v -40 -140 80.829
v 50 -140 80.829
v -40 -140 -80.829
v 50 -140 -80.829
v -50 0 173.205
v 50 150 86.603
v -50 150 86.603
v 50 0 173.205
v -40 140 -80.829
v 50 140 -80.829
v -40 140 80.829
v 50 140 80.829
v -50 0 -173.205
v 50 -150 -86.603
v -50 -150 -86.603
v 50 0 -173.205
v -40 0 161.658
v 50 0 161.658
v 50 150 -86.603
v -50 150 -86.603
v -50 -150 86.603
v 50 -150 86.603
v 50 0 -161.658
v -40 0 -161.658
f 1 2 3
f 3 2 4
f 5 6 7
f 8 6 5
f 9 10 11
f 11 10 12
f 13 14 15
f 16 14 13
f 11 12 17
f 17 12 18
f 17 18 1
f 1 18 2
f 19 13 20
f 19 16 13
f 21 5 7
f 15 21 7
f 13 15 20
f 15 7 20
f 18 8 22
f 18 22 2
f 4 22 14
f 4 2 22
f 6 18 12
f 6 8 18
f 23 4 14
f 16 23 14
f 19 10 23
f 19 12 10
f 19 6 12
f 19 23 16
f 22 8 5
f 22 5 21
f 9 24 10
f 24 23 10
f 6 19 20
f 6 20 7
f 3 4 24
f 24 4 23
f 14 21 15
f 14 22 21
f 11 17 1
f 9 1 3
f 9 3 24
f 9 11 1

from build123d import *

# Parameters (mm, degrees)
RESSALTO_EXTRUS_O1_DEPTH = 50
CASCA1_T                 = -10


with BuildPart() as part:
    # Esboço1 → Ressalto-extrusão1 (new body, symmetric)
    with BuildSketch(Plane(origin=(0, 0, 0), x_dir=(0, 0, -1), z_dir=(1, 0, 0))):
        Polygon((173.205080757, 0), (86.602540378, 150), (-86.602540378, 150), (-173.205080757, 0), (-86.602540378, -150), (86.602540378, -150), align=None)
    extrude(amount=RESSALTO_EXTRUS_O1_DEPTH, both=True)

    # Casca1
    casca1_openings = [part.faces().sort_by_distance(p)[0] for p in [
        (50, 0, 0),
    ]]
    offset(amount=CASCA1_T, openings=casca1_openings, kind=Kind.INTERSECTION)


solid = part.part
